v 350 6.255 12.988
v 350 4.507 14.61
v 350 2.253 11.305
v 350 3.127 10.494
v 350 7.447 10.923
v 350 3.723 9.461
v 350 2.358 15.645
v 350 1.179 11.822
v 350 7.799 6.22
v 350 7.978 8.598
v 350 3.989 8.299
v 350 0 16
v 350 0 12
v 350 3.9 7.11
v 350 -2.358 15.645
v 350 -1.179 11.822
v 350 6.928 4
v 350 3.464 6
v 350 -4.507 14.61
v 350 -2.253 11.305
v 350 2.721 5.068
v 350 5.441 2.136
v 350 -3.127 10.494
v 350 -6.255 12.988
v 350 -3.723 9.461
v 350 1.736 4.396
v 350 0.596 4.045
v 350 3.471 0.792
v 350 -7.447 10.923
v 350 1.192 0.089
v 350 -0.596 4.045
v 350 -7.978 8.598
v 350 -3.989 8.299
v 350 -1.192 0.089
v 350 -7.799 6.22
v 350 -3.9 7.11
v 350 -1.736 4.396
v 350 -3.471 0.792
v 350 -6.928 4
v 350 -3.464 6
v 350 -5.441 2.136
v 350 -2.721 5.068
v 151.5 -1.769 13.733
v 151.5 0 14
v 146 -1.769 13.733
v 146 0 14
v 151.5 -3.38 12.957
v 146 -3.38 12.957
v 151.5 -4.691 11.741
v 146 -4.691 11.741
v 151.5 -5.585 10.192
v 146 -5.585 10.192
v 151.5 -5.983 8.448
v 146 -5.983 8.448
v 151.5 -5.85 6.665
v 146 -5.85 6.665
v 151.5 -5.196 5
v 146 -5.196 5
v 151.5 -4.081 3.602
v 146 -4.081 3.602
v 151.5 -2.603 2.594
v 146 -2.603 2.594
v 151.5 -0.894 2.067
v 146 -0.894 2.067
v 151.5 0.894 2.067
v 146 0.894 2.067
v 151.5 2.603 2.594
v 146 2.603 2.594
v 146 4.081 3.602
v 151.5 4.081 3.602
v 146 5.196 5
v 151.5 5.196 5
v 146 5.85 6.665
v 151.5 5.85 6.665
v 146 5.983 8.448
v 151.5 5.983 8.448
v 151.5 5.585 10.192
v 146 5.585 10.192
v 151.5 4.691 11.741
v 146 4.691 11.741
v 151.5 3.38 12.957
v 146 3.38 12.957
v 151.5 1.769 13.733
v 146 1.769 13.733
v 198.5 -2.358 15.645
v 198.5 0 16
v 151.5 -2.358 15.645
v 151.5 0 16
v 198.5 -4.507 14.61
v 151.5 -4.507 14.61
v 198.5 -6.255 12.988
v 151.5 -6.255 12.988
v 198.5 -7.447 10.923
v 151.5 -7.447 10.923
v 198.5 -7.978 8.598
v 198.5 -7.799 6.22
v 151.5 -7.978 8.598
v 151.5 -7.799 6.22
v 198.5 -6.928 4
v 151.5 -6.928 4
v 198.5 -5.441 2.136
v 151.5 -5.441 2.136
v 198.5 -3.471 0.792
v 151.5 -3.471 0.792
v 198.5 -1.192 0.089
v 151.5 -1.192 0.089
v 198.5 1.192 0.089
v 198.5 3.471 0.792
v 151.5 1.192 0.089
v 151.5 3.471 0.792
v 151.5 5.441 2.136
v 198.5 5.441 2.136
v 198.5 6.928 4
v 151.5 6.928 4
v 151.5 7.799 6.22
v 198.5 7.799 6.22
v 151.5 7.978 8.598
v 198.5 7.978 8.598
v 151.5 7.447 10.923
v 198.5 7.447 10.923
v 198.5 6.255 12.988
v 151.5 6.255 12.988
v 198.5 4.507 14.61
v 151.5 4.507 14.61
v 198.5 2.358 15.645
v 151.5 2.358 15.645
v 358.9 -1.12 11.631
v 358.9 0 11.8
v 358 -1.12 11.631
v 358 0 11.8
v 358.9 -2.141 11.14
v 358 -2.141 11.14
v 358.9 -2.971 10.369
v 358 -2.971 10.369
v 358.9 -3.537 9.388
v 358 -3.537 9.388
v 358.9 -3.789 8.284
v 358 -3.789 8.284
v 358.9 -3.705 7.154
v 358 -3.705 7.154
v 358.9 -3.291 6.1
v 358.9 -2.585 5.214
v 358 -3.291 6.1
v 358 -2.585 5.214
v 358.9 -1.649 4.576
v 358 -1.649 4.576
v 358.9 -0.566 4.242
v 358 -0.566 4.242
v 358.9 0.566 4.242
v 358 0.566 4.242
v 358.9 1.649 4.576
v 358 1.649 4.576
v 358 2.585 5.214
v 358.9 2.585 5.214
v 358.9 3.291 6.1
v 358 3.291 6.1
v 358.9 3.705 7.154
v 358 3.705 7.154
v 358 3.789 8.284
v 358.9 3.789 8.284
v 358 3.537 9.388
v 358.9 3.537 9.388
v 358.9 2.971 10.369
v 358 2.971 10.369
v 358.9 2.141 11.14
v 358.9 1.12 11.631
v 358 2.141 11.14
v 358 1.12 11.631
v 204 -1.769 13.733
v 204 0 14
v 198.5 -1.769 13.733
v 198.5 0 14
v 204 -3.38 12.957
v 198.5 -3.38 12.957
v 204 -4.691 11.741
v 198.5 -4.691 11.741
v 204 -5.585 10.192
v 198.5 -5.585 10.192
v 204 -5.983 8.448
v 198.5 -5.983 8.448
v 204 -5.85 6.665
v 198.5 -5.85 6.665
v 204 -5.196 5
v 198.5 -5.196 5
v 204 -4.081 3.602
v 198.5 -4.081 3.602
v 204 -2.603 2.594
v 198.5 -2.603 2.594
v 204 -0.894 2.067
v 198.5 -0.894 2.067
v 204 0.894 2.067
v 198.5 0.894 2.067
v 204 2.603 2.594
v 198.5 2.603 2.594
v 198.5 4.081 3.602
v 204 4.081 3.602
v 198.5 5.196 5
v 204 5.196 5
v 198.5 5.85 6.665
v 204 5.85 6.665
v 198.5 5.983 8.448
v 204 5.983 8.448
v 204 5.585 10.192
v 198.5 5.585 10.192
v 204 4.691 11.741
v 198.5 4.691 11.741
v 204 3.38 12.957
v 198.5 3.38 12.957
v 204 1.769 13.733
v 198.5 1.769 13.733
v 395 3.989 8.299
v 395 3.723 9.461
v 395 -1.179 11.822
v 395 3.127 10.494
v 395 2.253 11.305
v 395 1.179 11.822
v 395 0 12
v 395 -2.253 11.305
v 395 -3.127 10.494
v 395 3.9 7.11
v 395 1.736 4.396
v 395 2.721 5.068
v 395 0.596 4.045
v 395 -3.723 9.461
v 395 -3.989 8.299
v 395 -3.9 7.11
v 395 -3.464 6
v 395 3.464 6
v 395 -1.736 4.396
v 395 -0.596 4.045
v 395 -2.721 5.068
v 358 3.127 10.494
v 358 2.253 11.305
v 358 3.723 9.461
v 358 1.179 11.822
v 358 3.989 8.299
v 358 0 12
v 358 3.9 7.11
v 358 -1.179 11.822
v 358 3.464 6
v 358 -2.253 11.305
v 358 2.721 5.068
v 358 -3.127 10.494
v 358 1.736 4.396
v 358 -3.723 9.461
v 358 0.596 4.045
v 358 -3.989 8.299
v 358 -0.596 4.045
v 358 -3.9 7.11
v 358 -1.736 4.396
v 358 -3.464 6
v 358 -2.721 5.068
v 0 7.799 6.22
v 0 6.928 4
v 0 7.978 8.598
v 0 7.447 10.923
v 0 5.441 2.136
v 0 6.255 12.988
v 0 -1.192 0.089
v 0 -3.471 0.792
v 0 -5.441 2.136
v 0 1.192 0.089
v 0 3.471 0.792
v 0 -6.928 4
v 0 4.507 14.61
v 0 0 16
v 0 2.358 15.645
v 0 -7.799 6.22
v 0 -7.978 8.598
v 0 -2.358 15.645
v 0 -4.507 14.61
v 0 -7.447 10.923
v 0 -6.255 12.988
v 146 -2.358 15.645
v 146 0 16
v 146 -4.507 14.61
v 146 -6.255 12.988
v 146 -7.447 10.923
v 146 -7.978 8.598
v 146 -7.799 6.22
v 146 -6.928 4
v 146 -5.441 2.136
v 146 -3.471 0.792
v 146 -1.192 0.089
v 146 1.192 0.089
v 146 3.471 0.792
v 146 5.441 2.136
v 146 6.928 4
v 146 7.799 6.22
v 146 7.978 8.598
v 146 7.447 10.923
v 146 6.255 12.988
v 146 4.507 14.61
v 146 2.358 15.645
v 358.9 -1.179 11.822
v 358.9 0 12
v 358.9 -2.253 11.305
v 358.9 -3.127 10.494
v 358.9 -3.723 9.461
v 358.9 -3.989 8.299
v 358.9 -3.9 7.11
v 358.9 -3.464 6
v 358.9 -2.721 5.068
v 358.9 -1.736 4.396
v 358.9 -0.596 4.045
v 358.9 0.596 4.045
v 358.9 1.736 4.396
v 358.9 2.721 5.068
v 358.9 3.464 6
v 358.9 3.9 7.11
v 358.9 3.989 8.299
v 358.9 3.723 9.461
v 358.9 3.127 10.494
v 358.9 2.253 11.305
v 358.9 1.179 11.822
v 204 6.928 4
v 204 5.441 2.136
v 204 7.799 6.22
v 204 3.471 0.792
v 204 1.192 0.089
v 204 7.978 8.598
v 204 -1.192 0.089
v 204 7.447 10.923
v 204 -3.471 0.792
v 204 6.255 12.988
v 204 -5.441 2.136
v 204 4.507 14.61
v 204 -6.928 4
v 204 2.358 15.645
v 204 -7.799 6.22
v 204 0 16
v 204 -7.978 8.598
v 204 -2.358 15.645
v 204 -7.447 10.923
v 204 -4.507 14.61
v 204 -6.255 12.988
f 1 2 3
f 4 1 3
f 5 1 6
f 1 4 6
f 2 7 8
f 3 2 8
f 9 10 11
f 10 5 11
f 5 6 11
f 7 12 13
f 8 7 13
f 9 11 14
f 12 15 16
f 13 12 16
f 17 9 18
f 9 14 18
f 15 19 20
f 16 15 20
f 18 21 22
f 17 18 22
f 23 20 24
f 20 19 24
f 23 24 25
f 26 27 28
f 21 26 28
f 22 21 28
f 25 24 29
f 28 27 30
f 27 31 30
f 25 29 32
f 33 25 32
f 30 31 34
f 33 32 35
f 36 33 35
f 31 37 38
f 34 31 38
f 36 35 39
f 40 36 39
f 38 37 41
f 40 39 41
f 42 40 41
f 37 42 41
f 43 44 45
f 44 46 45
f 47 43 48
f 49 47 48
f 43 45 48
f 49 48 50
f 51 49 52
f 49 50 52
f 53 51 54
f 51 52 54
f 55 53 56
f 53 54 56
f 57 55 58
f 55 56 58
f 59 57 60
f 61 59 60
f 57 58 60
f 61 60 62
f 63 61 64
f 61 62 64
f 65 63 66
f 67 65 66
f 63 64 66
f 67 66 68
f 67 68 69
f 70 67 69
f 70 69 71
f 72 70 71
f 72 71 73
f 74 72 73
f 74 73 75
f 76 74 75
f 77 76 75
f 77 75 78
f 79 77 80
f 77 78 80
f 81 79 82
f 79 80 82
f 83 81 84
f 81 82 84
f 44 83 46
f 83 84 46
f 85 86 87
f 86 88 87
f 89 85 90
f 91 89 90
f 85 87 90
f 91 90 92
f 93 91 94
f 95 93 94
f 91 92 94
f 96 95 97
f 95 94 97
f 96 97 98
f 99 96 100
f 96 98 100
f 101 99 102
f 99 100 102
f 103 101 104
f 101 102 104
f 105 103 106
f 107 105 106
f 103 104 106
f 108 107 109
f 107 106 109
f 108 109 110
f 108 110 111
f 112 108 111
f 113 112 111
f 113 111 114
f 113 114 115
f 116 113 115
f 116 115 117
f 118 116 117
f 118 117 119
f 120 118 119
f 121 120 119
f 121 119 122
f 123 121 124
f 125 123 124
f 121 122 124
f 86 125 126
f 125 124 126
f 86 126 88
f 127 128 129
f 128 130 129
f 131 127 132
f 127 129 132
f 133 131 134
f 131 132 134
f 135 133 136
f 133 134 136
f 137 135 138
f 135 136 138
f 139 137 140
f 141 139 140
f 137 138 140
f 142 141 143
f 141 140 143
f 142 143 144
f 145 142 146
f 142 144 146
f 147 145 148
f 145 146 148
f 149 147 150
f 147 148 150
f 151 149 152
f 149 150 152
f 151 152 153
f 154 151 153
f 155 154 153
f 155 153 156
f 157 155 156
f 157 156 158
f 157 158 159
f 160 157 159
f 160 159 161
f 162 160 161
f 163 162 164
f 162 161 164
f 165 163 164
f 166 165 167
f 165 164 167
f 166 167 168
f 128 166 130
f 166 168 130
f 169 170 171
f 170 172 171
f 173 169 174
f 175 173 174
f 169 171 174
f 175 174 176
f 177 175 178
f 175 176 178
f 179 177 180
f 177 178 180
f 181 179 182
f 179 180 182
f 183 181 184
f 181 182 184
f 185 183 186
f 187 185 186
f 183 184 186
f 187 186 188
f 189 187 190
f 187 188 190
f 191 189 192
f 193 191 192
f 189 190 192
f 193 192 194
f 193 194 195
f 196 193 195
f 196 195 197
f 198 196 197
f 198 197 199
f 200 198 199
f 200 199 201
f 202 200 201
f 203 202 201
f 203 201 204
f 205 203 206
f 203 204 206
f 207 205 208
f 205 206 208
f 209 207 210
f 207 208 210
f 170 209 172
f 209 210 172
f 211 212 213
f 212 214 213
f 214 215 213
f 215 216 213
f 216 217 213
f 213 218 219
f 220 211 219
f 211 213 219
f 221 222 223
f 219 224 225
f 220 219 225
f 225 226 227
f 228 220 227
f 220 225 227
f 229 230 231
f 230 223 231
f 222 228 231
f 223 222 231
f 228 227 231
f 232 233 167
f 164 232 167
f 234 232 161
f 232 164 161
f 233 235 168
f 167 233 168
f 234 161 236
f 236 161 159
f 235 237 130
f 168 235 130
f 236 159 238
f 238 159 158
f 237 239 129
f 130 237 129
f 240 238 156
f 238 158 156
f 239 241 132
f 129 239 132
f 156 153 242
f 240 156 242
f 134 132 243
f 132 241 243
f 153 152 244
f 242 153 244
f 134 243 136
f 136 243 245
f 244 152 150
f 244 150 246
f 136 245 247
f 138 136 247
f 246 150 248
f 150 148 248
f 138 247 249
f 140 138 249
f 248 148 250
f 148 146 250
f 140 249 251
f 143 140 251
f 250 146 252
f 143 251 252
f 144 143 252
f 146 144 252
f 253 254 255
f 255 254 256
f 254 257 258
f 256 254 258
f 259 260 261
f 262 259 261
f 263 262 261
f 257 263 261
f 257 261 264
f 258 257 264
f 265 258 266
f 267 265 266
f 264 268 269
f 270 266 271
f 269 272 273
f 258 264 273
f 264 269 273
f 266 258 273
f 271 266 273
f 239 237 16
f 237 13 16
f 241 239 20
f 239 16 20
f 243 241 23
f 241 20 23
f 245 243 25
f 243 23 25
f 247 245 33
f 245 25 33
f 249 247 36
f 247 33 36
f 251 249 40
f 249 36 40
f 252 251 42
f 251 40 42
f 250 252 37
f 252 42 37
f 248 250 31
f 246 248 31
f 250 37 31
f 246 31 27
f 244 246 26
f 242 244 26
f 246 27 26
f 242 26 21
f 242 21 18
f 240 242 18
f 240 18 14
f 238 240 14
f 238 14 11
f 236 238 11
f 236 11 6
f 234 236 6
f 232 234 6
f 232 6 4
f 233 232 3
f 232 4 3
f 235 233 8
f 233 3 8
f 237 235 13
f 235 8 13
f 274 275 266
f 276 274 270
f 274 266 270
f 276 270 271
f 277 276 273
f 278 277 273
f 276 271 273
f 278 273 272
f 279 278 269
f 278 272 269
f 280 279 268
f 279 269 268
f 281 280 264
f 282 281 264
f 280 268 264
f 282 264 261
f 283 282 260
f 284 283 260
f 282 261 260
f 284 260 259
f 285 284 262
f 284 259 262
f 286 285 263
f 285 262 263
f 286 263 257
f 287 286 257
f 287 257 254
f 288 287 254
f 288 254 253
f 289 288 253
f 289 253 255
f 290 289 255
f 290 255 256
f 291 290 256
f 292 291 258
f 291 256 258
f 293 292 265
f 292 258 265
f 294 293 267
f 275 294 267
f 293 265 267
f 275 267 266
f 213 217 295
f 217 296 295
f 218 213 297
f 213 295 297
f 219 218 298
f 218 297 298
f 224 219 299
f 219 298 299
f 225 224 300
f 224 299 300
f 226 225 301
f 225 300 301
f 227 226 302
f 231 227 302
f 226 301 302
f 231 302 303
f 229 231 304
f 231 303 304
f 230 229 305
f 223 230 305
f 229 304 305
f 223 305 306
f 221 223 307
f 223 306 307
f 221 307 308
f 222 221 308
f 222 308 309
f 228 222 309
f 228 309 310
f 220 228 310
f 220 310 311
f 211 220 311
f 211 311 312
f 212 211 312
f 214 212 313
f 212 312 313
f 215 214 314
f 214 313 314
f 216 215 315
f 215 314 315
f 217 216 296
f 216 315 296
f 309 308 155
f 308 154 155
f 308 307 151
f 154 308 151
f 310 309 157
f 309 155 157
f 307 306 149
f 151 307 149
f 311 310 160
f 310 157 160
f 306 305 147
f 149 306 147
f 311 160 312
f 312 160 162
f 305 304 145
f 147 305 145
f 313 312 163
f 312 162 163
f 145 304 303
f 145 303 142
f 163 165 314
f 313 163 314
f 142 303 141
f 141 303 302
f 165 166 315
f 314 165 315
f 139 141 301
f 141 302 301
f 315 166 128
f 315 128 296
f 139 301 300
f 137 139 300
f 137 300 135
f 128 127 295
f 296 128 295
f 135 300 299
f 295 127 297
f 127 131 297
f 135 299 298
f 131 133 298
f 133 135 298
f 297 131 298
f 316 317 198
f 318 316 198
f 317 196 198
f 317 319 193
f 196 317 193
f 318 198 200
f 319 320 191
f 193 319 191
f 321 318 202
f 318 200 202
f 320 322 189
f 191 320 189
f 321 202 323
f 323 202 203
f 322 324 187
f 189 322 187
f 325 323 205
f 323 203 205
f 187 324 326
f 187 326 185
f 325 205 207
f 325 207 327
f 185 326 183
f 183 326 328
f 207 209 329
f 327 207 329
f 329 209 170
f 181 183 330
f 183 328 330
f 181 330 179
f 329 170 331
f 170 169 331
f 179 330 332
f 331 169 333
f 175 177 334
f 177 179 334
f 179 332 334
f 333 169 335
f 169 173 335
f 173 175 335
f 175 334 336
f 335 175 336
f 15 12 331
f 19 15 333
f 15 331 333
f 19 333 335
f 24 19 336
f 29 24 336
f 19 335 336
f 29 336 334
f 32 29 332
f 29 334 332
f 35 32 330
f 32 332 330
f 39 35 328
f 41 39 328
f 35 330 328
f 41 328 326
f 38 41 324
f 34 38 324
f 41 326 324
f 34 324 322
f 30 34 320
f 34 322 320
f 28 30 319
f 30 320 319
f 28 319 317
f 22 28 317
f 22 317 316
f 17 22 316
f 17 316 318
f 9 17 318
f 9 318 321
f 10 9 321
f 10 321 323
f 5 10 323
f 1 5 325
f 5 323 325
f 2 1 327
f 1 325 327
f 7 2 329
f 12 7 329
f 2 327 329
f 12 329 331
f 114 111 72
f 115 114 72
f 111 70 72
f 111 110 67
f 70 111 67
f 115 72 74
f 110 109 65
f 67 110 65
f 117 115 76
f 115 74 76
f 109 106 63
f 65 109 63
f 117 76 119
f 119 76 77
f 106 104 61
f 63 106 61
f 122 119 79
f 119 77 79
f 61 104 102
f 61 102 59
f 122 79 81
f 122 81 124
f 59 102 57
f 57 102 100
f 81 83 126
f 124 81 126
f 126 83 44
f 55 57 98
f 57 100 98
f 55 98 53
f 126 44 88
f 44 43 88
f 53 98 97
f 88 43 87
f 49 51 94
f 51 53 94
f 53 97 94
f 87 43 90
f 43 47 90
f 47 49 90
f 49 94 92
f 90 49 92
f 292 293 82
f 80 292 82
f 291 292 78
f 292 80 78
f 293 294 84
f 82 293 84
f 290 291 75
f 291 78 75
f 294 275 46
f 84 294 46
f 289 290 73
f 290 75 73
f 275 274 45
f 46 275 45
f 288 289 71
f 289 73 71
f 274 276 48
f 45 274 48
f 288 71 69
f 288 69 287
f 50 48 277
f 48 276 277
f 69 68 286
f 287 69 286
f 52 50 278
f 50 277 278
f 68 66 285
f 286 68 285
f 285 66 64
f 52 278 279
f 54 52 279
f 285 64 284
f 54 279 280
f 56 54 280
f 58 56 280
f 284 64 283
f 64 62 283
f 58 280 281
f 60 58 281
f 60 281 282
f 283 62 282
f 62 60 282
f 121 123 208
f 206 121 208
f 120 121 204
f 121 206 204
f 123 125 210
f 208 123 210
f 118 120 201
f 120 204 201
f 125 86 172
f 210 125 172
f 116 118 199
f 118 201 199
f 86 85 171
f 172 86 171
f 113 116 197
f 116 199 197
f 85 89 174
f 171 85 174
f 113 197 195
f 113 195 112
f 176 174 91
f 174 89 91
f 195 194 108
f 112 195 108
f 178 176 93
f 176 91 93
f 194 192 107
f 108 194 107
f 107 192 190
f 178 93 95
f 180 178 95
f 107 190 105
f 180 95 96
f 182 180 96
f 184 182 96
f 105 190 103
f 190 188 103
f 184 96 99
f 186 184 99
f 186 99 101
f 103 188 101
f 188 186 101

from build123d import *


with BuildPart() as f1:
    # F0 (on Front) → F1 (revolve)
    with BuildSketch(Plane.XZ):
        Polygon((146, 16), (0, 16), (0, 8), (358, 8), (358.9, 8), (395, 8), (395, 12), (358.9, 12), (358.9, 11.8), (358, 11.8), (358, 12), (350, 12), (350, 16), (204, 16), (204, 14), (198.5, 14), (198.5, 16), (151.5, 16), (151.5, 14), (146, 14), align=None)
    revolve(axis=Axis((197.5, 0, 8), (1, 0, 0)))


solid = f1.part
